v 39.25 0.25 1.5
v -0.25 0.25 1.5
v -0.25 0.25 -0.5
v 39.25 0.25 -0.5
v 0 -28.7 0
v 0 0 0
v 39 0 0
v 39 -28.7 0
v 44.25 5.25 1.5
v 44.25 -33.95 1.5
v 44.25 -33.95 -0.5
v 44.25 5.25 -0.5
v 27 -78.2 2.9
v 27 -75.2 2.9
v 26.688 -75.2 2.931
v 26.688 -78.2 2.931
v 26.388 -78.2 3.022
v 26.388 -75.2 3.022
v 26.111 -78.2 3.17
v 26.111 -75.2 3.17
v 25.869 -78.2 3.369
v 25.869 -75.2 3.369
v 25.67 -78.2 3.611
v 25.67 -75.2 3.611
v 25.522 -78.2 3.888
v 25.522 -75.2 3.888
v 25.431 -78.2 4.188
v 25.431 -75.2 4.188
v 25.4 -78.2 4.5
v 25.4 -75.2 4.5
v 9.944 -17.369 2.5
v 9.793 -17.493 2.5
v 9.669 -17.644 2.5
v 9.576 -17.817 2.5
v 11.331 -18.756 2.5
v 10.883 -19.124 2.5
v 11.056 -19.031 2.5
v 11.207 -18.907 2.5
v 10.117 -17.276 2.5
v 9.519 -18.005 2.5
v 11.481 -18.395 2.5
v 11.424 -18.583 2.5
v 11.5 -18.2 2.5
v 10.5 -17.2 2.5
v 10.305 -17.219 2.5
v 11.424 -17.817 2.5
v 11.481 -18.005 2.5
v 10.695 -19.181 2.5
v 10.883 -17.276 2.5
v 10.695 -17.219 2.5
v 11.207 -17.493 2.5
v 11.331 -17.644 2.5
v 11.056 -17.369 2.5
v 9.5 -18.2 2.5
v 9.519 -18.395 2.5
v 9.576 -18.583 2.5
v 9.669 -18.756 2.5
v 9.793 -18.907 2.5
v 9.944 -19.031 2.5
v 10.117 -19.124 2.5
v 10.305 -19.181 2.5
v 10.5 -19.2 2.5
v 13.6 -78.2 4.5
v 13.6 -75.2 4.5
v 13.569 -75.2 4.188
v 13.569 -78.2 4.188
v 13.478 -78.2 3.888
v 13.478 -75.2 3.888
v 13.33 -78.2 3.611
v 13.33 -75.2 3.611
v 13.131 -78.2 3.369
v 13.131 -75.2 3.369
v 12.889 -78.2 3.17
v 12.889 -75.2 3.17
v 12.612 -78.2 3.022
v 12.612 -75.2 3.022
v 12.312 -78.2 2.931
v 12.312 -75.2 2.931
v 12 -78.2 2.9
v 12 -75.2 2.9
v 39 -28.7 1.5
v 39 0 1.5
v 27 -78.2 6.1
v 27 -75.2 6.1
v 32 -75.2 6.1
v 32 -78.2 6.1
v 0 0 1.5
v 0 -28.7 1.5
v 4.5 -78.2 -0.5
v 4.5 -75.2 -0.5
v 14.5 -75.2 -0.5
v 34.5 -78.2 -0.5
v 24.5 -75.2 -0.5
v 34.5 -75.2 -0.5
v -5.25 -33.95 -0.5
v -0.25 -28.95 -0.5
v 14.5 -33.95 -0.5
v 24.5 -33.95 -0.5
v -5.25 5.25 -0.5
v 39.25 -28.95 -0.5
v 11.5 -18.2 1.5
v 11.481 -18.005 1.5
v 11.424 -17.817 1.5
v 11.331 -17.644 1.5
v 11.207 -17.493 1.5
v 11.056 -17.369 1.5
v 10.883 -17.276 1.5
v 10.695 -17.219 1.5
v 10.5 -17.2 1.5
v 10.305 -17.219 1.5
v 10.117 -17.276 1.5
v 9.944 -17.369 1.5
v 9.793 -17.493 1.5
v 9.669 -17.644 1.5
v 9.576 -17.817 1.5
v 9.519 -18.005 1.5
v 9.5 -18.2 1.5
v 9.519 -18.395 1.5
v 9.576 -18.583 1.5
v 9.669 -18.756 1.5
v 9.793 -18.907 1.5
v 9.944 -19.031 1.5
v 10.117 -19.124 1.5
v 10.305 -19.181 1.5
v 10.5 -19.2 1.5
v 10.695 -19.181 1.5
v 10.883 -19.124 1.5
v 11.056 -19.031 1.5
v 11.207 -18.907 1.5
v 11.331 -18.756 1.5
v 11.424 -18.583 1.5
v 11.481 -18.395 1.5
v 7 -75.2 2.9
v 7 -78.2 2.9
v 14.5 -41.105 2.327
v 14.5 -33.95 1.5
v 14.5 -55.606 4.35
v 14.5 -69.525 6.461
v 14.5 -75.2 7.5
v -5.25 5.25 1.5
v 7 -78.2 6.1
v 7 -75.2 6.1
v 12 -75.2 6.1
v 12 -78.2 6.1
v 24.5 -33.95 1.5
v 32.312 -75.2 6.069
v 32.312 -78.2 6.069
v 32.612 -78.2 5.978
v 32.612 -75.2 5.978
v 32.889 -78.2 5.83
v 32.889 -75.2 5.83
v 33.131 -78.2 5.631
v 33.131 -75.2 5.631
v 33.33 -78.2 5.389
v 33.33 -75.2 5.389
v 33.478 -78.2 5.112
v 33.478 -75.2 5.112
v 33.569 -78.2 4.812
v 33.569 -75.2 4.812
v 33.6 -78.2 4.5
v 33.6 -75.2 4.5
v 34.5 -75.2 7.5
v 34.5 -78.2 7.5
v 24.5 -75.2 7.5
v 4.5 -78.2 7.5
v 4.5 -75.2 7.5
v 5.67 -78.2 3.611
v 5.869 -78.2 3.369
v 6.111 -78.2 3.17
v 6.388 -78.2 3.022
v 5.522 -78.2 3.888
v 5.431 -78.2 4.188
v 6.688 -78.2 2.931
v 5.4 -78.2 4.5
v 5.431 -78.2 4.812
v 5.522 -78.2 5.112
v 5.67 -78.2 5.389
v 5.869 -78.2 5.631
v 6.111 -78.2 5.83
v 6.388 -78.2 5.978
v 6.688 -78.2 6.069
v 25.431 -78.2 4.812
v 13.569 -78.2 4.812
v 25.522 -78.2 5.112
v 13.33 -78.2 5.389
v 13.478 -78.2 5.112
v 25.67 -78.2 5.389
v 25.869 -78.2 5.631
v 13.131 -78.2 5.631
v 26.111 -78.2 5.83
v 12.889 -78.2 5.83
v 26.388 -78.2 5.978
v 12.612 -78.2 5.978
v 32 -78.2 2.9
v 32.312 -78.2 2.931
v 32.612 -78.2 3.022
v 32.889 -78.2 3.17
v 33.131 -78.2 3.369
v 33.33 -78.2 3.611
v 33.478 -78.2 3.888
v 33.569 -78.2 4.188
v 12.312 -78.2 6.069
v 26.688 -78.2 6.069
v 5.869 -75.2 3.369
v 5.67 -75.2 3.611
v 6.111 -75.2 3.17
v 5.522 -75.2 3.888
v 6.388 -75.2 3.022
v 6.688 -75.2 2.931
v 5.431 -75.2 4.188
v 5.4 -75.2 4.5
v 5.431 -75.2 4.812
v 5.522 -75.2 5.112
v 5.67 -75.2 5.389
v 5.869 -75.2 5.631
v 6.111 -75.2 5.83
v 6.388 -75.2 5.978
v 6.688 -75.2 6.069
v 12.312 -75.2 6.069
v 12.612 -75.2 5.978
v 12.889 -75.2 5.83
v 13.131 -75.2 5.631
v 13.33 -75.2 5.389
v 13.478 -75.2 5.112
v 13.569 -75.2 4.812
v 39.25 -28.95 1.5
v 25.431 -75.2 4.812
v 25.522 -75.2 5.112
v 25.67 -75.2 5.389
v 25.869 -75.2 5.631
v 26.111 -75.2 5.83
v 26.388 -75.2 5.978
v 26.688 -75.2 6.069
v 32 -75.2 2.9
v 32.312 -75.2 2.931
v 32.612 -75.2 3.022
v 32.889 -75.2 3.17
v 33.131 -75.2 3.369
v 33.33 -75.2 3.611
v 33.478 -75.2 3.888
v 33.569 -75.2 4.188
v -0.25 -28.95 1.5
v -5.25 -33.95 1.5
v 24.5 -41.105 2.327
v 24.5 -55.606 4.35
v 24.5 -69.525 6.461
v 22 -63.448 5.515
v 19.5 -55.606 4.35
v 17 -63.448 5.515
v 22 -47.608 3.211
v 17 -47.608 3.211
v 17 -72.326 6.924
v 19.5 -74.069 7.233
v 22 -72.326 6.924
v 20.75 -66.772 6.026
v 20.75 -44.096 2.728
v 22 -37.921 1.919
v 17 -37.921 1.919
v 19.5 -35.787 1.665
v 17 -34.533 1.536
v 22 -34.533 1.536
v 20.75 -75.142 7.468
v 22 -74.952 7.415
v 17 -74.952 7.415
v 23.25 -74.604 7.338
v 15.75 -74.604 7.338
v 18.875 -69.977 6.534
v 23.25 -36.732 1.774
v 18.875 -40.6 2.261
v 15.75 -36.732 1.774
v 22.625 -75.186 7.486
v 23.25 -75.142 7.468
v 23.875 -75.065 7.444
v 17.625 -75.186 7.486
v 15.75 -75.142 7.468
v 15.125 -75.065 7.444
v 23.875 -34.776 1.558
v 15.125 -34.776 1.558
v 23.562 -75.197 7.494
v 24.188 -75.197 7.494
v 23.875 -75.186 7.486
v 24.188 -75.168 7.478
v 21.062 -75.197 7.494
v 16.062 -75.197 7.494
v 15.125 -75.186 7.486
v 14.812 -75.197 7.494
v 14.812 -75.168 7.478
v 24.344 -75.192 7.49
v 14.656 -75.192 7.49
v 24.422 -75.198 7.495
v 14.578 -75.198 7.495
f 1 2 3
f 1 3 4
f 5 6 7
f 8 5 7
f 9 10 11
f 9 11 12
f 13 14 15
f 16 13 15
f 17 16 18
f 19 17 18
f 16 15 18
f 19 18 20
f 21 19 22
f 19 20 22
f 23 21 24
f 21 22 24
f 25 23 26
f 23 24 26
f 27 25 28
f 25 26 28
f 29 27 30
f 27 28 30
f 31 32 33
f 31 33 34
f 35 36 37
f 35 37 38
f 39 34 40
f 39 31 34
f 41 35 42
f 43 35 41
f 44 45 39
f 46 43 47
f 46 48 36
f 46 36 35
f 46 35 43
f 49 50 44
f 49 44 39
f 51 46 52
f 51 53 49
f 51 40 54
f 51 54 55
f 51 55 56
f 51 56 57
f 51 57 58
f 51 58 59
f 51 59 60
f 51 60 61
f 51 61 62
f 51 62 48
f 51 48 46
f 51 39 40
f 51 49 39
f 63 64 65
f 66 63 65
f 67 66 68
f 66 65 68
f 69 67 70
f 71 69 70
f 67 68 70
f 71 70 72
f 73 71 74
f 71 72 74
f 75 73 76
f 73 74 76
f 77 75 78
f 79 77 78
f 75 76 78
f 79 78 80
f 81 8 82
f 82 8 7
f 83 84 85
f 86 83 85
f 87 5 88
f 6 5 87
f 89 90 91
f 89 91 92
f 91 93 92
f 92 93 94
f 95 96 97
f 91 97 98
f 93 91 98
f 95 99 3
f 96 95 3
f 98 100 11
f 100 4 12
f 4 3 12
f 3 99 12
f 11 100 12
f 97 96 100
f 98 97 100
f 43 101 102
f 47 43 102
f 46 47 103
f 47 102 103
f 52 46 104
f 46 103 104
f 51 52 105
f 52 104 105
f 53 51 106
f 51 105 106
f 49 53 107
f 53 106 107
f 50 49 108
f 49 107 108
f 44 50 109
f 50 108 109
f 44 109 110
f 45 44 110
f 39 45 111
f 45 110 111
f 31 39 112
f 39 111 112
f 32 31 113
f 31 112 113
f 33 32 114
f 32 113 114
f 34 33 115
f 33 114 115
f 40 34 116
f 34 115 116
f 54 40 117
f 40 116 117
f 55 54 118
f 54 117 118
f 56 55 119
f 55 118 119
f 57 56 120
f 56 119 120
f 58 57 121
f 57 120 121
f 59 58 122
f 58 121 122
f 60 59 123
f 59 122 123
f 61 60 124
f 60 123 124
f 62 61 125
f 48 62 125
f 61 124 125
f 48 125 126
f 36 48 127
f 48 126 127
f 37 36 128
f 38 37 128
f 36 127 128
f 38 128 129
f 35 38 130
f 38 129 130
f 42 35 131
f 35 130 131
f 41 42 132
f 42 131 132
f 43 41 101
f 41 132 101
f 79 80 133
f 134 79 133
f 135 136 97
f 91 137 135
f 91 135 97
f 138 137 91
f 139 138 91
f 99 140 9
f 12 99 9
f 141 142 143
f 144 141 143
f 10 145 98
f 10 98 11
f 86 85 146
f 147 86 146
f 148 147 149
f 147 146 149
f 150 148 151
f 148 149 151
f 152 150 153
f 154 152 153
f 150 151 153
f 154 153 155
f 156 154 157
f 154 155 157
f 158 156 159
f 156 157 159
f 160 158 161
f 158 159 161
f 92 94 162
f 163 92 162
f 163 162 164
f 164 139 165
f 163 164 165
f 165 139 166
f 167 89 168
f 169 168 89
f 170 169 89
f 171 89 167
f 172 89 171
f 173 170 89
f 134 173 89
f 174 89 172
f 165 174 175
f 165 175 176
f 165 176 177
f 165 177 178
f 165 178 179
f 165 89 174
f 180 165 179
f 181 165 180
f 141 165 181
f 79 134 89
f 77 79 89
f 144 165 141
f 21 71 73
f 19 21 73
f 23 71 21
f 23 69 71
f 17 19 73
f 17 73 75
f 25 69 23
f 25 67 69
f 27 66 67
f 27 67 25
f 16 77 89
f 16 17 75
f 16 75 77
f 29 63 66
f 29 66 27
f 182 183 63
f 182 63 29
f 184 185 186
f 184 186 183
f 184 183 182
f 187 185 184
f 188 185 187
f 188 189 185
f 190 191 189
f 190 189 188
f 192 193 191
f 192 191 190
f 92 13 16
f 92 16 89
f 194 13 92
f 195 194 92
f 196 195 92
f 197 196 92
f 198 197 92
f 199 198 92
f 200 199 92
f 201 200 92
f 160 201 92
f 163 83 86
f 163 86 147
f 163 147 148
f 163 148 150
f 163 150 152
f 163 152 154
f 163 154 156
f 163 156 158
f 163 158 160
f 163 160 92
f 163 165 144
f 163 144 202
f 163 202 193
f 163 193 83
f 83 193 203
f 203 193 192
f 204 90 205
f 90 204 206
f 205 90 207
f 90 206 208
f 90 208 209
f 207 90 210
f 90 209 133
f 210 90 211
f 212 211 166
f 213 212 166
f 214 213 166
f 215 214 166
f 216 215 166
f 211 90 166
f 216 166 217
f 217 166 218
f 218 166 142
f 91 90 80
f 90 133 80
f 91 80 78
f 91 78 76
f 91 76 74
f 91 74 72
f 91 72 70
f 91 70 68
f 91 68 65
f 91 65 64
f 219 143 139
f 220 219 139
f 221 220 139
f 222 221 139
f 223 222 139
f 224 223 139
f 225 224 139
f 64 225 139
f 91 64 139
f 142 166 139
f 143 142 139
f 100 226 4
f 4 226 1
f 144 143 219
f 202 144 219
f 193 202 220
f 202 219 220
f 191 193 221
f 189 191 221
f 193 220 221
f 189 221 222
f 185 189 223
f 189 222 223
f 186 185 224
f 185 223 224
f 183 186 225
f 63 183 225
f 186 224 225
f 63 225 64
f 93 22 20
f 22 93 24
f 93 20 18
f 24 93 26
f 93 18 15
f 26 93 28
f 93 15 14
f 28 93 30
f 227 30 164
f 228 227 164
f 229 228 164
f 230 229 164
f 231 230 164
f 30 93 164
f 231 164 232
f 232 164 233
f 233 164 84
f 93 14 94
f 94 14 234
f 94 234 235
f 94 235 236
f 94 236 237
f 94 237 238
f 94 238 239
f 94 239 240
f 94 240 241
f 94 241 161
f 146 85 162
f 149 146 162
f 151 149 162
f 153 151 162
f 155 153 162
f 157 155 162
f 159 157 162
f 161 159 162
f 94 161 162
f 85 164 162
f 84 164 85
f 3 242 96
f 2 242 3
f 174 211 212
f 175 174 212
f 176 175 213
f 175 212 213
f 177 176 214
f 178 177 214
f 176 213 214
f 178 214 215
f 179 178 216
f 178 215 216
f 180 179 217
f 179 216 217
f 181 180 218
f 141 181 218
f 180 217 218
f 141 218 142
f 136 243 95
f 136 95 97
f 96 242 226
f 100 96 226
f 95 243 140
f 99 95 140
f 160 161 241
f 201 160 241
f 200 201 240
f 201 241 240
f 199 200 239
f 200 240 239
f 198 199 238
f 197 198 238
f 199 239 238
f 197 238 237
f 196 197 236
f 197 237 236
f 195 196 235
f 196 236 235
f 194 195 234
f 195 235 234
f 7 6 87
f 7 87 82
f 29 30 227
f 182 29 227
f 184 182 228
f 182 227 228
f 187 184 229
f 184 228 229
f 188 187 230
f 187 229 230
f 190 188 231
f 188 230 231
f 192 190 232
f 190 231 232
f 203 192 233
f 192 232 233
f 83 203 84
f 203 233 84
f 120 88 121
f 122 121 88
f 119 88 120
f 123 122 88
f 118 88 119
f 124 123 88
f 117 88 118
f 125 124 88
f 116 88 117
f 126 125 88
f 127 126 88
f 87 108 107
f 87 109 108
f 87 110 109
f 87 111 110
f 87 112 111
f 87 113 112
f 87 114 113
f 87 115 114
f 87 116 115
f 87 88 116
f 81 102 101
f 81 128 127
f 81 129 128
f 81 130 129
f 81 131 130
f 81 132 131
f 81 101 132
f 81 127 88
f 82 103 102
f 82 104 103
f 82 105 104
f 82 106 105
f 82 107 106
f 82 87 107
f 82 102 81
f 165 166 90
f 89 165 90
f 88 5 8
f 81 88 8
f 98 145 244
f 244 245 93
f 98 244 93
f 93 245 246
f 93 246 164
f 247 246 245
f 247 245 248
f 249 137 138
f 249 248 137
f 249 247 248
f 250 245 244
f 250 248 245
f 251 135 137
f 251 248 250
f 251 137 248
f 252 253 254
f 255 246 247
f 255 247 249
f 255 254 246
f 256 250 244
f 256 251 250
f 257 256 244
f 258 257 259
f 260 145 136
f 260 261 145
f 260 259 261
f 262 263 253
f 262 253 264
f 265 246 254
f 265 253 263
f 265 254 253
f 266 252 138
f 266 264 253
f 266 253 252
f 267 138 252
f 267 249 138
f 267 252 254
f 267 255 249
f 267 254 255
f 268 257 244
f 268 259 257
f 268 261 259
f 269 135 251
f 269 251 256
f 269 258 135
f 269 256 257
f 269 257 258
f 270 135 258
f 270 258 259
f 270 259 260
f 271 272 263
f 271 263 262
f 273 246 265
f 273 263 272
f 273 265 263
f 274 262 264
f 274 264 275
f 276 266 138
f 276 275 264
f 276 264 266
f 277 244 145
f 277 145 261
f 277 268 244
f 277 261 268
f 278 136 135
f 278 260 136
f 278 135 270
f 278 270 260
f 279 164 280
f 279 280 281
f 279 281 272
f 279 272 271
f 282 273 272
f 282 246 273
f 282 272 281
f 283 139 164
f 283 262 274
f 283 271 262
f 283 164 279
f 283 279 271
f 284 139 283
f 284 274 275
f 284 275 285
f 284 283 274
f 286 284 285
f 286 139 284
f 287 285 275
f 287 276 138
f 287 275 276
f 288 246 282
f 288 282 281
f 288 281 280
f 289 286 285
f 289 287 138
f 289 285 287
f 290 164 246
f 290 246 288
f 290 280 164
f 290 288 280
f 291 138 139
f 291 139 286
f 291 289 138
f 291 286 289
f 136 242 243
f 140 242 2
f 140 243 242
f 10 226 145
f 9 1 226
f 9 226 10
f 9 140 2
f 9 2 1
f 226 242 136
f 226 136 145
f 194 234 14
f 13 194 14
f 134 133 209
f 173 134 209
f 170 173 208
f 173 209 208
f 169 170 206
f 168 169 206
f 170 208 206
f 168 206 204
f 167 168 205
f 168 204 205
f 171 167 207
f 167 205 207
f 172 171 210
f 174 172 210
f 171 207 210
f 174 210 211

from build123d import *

# Parameters (mm, degrees)
SKETCH1_W            = 39
SKETCH1_H            = 28.7
BOSS_EXTRUDE2_DEPTH  = 1.5
SKETCH3_R            = 1
BOSS_EXTRUDE3_DEPTH  = 1
SKETCH4_W            = 49.5
SKETCH4_H            = 39.2
SKETCH4_W_2          = 39.5
SKETCH4_H_2          = 29.2
BOSS_EXTRUDE4_DEPTH  = 2
SKETCH6_W            = 10
SKETCH6_H            = 2
BOSS_EXTRUDE5_DEPTH  = 41.25
SKETCH7_W            = 10
SKETCH7_H            = 3
SKETCH7_H_2          = 2
BOSS_EXTRUDE10_DEPTH = 3
FILLET5_START        = 14.5
FILLET5_DEPTH        = 10


with BuildPart() as part:
    # Sketch1 → Boss-Extrude2 (new body)
    with BuildSketch(Plane.XY):
        with Locations((19.5, -14.35)):
            Rectangle(SKETCH1_W, SKETCH1_H)
    extrude(amount=BOSS_EXTRUDE2_DEPTH)

    # Sketch3 → Boss-Extrude3 (add)
    with BuildSketch(Plane.XY.offset(1.5)):
        with Locations((10.5, -18.2)):
            Circle(SKETCH3_R)
    extrude(amount=BOSS_EXTRUDE3_DEPTH)


with BuildPart() as body_2:
    # Sketch4 → Boss-Extrude4 (new body)
    with BuildSketch(Plane.XY.offset(1.5)):
        with Locations((19.5, -14.35)):
            Rectangle(SKETCH4_W, SKETCH4_H)
        with Locations((19.5, -14.35)):
            Rectangle(SKETCH4_W_2, SKETCH4_H_2, mode=Mode.SUBTRACT)
    extrude(amount=-BOSS_EXTRUDE4_DEPTH)

    # Sketch6 → Boss-Extrude5 (add)
    with BuildSketch(Plane.XZ.offset(33.95)):
        with Locations((19.5, 0.5)):
            Rectangle(SKETCH6_W, SKETCH6_H)
    extrude(amount=BOSS_EXTRUDE5_DEPTH)

    # Sketch7 → Boss-Extrude10 (add)
    with BuildSketch(Plane.XZ.offset(75.2)):
        with BuildLine():
            Line((13.6, 4.5), (14.5, 4.5))
            Line((14.5, 4.5), (14.5, 7.5))
            Line((14.5, 7.5), (4.5, 7.5))
            Line((4.5, 7.5), (4.5, 4.5))
            Line((4.5, 4.5), (5.4, 4.5))
            ThreePointArc((5.4, 4.5), (5.86862915, 5.63137085), (7, 6.1))
            Line((7, 6.1), (12, 6.1))
            ThreePointArc((12, 6.1), (13.13137085, 5.63137085), (13.6, 4.5))
        make_face()
        with BuildLine():
            Line((4.5, 1.5), (14.5, 1.5))
            Line((14.5, 1.5), (14.5, 4.5))
            Line((14.5, 4.5), (13.6, 4.5))
            ThreePointArc((13.6, 4.5), (13.13137085, 3.36862915), (12, 2.9))
            Line((12, 2.9), (7, 2.9))
            ThreePointArc((7, 2.9), (5.86862915, 3.36862915), (5.4, 4.5))
            Line((5.4, 4.5), (4.5, 4.5))
            Line((4.5, 4.5), (4.5, 1.5))
        make_face()
        with Locations((19.5, 6)):
            Rectangle(SKETCH7_W, SKETCH7_H)
        with Locations((19.5, 3)):
            Rectangle(SKETCH7_W, SKETCH7_H)
        with BuildLine():
            Line((24.5, 4.5), (24.5, 1.5))
            Line((24.5, 1.5), (34.5, 1.5))
            Line((34.5, 1.5), (34.5, 4.5))
            Line((34.5, 4.5), (33.6, 4.5))
            ThreePointArc((33.6, 4.5), (33.13137085, 3.36862915), (32, 2.9))
            Line((32, 2.9), (27, 2.9))
            ThreePointArc((27, 2.9), (25.86862915, 3.36862915), (25.4, 4.5))
            Line((25.4, 4.5), (24.5, 4.5))
        make_face()
        with BuildLine():
            Line((24.5, 7.5), (24.5, 4.5))
            Line((24.5, 4.5), (25.4, 4.5))
            ThreePointArc((25.4, 4.5), (25.86862915, 5.63137085), (27, 6.1))
            Line((27, 6.1), (32, 6.1))
            ThreePointArc((32, 6.1), (33.13137085, 5.63137085), (33.6, 4.5))
            Line((33.6, 4.5), (34.5, 4.5))
            Line((34.5, 4.5), (34.5, 7.5))
            Line((34.5, 7.5), (24.5, 7.5))
        make_face()
        with Locations((29.5, 0.5)):
            Rectangle(SKETCH7_W, SKETCH7_H_2)
        with Locations((19.5, 0.5)):
            Rectangle(SKETCH7_W, SKETCH7_H_2)
        with Locations((9.5, 0.5)):
            Rectangle(SKETCH7_W, SKETCH7_H_2)
    extrude(amount=BOSS_EXTRUDE10_DEPTH)

    # Fillet5: read off the stored shape, not the designer's step
    # Fillet5 outline → Fillet5 (add)
    with BuildSketch(Plane.YZ.offset(FILLET5_START)):
        with BuildLine():
            add(Edge.make_bspline(
                [(-75.2, 7.5), (-75.2, 1.5), (-33.95, 1.5)],
                knots=[0, 0, 0, 1, 1, 1], degree=2, weights=[1, 0.052631579, 1]))
            Line((-75.2, 7.5), (-75.2, 1.5))
            Line((-75.2, 1.5), (-33.95, 1.5))
        make_face()
    extrude(amount=FILLET5_DEPTH)


solid = Compound([part.part, body_2.part])
